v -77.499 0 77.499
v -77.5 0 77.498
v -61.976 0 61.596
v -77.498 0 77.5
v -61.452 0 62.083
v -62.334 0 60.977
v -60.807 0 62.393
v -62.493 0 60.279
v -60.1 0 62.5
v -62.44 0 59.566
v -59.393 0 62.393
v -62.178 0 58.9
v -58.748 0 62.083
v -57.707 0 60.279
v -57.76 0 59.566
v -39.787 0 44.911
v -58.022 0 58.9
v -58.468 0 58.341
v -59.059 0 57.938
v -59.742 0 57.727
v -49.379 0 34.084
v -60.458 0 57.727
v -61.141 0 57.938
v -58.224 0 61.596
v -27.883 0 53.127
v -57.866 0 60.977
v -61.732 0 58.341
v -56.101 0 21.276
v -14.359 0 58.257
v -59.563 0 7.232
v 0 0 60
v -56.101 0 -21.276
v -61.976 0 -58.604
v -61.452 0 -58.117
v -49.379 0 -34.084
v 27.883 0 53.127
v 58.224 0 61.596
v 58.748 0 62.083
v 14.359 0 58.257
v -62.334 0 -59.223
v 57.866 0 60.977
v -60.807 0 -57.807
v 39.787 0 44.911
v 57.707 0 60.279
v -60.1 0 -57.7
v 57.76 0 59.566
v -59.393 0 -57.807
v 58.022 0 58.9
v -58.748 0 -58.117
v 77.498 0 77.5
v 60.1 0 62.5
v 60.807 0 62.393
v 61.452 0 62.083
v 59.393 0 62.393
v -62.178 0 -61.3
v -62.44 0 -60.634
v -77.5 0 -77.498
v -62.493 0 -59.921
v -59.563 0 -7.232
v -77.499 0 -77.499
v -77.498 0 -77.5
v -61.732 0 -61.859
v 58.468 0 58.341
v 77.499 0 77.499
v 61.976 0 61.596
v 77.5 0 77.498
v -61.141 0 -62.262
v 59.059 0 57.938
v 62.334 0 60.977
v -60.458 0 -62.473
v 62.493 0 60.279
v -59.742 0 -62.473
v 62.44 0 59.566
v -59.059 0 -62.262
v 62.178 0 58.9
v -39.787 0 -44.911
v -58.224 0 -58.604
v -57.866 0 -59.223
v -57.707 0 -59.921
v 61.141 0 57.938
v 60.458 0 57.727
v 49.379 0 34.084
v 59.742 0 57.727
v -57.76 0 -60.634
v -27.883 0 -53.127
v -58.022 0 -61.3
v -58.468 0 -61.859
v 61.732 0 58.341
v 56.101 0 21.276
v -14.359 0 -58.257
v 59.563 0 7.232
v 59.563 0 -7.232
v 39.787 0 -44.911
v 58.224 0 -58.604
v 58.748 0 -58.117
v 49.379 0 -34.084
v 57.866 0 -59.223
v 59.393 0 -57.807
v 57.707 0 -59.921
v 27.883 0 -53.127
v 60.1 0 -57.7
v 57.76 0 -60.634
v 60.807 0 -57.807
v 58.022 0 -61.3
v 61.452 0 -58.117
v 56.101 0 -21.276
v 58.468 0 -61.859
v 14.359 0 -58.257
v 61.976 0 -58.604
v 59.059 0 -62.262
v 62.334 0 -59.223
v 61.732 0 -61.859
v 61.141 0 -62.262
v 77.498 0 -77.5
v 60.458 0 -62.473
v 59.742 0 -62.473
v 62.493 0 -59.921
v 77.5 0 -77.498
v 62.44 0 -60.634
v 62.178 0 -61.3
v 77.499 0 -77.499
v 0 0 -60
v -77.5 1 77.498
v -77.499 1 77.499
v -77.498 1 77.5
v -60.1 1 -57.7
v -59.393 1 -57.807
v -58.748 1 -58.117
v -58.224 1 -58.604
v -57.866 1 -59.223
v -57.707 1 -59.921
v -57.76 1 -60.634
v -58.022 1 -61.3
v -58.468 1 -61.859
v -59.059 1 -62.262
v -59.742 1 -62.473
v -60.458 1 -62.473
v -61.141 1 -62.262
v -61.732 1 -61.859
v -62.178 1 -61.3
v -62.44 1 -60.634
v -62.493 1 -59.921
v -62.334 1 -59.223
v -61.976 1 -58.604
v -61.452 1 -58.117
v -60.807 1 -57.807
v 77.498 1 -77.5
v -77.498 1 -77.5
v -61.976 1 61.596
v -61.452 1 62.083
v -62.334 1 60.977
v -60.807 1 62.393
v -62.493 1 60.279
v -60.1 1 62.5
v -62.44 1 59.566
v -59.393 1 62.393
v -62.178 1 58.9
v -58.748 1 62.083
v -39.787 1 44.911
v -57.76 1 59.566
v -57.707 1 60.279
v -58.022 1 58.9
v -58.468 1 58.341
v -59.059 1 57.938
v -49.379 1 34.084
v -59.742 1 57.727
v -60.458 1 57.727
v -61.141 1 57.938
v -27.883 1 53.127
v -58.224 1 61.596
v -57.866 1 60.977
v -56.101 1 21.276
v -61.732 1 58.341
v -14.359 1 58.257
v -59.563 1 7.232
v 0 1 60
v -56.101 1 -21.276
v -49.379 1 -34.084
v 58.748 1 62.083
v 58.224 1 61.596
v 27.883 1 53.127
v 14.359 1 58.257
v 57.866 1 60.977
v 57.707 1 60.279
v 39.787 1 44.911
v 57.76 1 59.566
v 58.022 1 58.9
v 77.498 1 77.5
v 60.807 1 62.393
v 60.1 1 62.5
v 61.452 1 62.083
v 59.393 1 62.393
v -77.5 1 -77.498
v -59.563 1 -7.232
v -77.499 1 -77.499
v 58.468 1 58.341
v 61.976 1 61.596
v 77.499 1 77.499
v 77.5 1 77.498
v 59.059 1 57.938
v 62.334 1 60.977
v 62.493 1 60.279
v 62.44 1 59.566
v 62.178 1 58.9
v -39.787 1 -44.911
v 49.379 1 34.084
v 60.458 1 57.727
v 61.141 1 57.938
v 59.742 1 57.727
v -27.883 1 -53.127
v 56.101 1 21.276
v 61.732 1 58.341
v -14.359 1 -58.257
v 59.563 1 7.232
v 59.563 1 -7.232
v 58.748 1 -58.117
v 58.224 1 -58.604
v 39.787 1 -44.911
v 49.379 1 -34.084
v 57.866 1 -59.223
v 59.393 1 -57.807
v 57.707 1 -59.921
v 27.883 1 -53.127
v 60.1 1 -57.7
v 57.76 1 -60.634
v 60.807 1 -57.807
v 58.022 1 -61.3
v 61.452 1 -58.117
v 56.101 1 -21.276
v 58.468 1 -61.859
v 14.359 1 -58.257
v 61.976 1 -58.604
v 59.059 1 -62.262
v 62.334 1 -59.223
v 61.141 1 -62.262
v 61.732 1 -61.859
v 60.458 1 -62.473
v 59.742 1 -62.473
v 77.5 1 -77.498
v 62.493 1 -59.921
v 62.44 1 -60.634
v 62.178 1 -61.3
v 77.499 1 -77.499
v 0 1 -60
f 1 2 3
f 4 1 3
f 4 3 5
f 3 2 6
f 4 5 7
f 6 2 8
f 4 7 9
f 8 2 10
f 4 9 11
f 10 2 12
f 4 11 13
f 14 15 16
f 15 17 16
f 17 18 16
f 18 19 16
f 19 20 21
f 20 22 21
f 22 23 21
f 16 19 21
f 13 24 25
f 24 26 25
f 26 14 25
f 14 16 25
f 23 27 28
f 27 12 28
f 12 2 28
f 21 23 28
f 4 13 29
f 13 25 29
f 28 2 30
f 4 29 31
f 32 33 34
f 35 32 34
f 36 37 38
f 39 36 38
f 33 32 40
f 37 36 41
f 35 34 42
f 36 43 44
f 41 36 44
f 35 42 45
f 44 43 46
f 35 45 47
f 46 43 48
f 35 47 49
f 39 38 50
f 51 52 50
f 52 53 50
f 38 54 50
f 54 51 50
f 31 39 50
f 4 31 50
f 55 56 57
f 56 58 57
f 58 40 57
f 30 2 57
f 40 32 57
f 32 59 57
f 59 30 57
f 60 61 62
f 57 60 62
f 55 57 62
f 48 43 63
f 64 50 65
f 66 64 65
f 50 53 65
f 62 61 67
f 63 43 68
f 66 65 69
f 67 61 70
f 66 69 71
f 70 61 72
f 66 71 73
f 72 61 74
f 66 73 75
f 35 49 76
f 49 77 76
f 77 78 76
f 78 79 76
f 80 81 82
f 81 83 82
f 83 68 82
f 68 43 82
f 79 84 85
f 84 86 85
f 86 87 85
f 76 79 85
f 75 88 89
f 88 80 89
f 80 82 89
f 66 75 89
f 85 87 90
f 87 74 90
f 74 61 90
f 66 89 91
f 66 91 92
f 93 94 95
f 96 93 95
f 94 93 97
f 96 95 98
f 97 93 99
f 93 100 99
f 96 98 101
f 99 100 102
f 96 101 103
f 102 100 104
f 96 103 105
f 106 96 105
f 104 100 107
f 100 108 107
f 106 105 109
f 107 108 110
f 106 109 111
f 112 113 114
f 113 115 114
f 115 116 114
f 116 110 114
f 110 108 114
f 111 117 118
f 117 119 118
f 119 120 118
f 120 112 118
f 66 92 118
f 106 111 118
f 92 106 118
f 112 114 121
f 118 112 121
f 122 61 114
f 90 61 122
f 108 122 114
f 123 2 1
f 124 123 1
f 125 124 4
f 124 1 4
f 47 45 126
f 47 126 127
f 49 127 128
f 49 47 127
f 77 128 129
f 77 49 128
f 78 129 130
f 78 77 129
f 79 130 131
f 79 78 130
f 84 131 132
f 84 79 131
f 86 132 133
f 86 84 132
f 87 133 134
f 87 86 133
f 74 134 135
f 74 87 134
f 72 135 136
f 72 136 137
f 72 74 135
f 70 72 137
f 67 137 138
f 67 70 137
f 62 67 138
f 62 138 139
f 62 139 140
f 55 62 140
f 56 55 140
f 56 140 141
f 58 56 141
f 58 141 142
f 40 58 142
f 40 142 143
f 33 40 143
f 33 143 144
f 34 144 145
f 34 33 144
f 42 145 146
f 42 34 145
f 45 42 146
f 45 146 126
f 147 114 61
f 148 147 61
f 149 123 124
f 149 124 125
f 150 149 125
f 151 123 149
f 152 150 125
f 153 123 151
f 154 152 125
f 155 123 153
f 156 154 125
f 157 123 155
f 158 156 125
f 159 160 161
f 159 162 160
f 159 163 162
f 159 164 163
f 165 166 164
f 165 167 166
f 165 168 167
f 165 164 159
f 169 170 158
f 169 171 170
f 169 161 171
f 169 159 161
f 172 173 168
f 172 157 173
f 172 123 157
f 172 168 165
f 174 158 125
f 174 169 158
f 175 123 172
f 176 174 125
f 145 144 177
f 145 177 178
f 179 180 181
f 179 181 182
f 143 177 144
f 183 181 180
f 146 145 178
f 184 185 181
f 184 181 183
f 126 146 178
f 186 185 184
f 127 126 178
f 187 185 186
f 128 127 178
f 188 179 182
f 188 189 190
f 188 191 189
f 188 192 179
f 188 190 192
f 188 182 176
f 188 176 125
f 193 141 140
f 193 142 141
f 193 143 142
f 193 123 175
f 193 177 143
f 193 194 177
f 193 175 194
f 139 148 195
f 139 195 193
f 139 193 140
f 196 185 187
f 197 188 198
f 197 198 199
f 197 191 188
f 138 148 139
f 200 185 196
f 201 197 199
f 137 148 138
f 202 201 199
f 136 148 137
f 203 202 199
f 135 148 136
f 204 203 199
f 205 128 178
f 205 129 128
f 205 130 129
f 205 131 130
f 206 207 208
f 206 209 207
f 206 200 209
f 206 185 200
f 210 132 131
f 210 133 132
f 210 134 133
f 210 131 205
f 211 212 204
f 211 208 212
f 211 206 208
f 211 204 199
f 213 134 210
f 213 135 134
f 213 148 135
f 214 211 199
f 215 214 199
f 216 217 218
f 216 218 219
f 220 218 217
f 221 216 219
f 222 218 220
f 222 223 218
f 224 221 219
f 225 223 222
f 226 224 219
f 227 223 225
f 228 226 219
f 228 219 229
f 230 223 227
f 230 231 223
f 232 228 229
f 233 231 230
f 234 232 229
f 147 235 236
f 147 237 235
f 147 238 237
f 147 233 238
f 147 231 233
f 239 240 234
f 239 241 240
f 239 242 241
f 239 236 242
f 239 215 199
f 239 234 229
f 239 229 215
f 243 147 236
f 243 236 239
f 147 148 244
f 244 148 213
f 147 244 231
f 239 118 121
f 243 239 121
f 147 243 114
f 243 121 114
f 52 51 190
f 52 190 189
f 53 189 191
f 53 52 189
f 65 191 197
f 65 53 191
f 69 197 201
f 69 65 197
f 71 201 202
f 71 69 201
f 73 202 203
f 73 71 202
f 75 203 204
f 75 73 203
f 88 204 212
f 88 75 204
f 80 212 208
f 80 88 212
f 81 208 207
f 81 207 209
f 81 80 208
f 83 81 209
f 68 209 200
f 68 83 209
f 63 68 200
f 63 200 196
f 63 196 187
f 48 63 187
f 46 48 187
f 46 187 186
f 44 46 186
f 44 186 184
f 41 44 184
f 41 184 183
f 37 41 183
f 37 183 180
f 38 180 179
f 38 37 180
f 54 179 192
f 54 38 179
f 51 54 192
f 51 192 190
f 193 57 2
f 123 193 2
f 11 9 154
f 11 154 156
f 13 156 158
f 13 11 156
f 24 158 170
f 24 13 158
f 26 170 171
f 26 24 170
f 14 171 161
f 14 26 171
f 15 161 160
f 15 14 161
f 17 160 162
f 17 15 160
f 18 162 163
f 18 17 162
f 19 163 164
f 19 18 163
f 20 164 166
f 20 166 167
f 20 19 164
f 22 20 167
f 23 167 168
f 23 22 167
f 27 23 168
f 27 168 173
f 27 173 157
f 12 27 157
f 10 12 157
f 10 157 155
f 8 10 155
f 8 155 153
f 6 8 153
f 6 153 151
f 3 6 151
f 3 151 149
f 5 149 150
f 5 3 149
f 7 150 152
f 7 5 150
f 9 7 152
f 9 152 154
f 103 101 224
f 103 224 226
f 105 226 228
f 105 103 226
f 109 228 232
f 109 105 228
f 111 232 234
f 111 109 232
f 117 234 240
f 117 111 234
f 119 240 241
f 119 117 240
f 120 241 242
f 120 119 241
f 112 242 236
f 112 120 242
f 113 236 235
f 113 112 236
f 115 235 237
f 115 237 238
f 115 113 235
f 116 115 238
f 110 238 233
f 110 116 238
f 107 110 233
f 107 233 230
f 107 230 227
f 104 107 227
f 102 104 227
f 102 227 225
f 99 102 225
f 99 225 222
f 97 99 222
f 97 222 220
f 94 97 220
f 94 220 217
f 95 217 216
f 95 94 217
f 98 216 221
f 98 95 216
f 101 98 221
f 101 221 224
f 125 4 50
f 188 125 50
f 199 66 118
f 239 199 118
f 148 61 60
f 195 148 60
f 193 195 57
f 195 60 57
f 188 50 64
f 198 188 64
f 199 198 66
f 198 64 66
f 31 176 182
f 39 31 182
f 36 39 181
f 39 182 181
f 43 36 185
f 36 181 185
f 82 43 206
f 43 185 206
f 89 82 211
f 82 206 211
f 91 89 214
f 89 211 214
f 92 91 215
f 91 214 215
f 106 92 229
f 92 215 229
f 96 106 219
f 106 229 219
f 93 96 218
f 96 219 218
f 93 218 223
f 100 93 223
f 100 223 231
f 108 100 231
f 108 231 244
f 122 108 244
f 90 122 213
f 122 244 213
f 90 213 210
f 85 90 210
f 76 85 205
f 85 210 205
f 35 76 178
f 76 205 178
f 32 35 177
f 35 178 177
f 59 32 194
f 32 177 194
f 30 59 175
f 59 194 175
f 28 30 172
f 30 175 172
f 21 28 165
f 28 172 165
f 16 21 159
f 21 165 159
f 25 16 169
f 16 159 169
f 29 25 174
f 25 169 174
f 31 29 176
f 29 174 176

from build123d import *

# Parameters (mm, degrees)
SKETCH2_R           = 2.4
BOSS_EXTRUDE1_DEPTH = 1
SKETCH3_R           = 60
CUT_EXTRUDE1_DEPTH  = 1


with BuildPart() as part:
    # Sketch2 → Boss-Extrude1 (new body)
    with BuildSketch(Plane(origin=(0, 0, 0), x_dir=(1, 0, 0), z_dir=(0, 1, 0))):
        with BuildLine():
            Line((77.497806421, 77.5), (-77.497806421, 77.5))
            ThreePointArc((-77.497806421, 77.5), (-77.498903218, 77.498903218), (-77.5, 77.497806421))
            Line((-77.5, 77.497806421), (-77.5, -77.497806421))
            ThreePointArc((-77.5, -77.497806421), (-77.498903218, -77.498903218), (-77.497806421, -77.5))
            Line((-77.497806421, -77.5), (77.497806421, -77.5))
            ThreePointArc((77.497806421, -77.5), (77.498903218, -77.498903218), (77.5, -77.497806421))
            Line((77.5, -77.497806421), (77.5, 77.497806421))
            ThreePointArc((77.5, 77.497806421), (77.498903218, 77.498903218), (77.497806421, 77.5))
        make_face()
        with Locations(Location((-60.1, -60.1, 0), (0, 0, 270))):
            Circle(SKETCH2_R, mode=Mode.SUBTRACT)
        with Locations(Location((60.1, -60.1, 0), (0, 0, 270))):
            Circle(SKETCH2_R, mode=Mode.SUBTRACT)
        with Locations(Location((-60.1, 60.1, 0), (0, 0, 270))):
            Circle(SKETCH2_R, mode=Mode.SUBTRACT)
        with Locations(Location((60.1, 60.1, 0), (0, 0, 270))):
            Circle(SKETCH2_R, mode=Mode.SUBTRACT)
    extrude(amount=BOSS_EXTRUDE1_DEPTH)

    # Sketch3 → Cut-Extrude1 (cut)
    with BuildSketch(Plane(origin=(0, 1, 0), x_dir=(1, 0, 0), z_dir=(0, 1, 0))):
        with Locations(Location((0, 0, 0), (0, 0, 270))):
            Circle(SKETCH3_R)
    extrude(amount=-CUT_EXTRUDE1_DEPTH, mode=Mode.SUBTRACT)


solid = part.part
